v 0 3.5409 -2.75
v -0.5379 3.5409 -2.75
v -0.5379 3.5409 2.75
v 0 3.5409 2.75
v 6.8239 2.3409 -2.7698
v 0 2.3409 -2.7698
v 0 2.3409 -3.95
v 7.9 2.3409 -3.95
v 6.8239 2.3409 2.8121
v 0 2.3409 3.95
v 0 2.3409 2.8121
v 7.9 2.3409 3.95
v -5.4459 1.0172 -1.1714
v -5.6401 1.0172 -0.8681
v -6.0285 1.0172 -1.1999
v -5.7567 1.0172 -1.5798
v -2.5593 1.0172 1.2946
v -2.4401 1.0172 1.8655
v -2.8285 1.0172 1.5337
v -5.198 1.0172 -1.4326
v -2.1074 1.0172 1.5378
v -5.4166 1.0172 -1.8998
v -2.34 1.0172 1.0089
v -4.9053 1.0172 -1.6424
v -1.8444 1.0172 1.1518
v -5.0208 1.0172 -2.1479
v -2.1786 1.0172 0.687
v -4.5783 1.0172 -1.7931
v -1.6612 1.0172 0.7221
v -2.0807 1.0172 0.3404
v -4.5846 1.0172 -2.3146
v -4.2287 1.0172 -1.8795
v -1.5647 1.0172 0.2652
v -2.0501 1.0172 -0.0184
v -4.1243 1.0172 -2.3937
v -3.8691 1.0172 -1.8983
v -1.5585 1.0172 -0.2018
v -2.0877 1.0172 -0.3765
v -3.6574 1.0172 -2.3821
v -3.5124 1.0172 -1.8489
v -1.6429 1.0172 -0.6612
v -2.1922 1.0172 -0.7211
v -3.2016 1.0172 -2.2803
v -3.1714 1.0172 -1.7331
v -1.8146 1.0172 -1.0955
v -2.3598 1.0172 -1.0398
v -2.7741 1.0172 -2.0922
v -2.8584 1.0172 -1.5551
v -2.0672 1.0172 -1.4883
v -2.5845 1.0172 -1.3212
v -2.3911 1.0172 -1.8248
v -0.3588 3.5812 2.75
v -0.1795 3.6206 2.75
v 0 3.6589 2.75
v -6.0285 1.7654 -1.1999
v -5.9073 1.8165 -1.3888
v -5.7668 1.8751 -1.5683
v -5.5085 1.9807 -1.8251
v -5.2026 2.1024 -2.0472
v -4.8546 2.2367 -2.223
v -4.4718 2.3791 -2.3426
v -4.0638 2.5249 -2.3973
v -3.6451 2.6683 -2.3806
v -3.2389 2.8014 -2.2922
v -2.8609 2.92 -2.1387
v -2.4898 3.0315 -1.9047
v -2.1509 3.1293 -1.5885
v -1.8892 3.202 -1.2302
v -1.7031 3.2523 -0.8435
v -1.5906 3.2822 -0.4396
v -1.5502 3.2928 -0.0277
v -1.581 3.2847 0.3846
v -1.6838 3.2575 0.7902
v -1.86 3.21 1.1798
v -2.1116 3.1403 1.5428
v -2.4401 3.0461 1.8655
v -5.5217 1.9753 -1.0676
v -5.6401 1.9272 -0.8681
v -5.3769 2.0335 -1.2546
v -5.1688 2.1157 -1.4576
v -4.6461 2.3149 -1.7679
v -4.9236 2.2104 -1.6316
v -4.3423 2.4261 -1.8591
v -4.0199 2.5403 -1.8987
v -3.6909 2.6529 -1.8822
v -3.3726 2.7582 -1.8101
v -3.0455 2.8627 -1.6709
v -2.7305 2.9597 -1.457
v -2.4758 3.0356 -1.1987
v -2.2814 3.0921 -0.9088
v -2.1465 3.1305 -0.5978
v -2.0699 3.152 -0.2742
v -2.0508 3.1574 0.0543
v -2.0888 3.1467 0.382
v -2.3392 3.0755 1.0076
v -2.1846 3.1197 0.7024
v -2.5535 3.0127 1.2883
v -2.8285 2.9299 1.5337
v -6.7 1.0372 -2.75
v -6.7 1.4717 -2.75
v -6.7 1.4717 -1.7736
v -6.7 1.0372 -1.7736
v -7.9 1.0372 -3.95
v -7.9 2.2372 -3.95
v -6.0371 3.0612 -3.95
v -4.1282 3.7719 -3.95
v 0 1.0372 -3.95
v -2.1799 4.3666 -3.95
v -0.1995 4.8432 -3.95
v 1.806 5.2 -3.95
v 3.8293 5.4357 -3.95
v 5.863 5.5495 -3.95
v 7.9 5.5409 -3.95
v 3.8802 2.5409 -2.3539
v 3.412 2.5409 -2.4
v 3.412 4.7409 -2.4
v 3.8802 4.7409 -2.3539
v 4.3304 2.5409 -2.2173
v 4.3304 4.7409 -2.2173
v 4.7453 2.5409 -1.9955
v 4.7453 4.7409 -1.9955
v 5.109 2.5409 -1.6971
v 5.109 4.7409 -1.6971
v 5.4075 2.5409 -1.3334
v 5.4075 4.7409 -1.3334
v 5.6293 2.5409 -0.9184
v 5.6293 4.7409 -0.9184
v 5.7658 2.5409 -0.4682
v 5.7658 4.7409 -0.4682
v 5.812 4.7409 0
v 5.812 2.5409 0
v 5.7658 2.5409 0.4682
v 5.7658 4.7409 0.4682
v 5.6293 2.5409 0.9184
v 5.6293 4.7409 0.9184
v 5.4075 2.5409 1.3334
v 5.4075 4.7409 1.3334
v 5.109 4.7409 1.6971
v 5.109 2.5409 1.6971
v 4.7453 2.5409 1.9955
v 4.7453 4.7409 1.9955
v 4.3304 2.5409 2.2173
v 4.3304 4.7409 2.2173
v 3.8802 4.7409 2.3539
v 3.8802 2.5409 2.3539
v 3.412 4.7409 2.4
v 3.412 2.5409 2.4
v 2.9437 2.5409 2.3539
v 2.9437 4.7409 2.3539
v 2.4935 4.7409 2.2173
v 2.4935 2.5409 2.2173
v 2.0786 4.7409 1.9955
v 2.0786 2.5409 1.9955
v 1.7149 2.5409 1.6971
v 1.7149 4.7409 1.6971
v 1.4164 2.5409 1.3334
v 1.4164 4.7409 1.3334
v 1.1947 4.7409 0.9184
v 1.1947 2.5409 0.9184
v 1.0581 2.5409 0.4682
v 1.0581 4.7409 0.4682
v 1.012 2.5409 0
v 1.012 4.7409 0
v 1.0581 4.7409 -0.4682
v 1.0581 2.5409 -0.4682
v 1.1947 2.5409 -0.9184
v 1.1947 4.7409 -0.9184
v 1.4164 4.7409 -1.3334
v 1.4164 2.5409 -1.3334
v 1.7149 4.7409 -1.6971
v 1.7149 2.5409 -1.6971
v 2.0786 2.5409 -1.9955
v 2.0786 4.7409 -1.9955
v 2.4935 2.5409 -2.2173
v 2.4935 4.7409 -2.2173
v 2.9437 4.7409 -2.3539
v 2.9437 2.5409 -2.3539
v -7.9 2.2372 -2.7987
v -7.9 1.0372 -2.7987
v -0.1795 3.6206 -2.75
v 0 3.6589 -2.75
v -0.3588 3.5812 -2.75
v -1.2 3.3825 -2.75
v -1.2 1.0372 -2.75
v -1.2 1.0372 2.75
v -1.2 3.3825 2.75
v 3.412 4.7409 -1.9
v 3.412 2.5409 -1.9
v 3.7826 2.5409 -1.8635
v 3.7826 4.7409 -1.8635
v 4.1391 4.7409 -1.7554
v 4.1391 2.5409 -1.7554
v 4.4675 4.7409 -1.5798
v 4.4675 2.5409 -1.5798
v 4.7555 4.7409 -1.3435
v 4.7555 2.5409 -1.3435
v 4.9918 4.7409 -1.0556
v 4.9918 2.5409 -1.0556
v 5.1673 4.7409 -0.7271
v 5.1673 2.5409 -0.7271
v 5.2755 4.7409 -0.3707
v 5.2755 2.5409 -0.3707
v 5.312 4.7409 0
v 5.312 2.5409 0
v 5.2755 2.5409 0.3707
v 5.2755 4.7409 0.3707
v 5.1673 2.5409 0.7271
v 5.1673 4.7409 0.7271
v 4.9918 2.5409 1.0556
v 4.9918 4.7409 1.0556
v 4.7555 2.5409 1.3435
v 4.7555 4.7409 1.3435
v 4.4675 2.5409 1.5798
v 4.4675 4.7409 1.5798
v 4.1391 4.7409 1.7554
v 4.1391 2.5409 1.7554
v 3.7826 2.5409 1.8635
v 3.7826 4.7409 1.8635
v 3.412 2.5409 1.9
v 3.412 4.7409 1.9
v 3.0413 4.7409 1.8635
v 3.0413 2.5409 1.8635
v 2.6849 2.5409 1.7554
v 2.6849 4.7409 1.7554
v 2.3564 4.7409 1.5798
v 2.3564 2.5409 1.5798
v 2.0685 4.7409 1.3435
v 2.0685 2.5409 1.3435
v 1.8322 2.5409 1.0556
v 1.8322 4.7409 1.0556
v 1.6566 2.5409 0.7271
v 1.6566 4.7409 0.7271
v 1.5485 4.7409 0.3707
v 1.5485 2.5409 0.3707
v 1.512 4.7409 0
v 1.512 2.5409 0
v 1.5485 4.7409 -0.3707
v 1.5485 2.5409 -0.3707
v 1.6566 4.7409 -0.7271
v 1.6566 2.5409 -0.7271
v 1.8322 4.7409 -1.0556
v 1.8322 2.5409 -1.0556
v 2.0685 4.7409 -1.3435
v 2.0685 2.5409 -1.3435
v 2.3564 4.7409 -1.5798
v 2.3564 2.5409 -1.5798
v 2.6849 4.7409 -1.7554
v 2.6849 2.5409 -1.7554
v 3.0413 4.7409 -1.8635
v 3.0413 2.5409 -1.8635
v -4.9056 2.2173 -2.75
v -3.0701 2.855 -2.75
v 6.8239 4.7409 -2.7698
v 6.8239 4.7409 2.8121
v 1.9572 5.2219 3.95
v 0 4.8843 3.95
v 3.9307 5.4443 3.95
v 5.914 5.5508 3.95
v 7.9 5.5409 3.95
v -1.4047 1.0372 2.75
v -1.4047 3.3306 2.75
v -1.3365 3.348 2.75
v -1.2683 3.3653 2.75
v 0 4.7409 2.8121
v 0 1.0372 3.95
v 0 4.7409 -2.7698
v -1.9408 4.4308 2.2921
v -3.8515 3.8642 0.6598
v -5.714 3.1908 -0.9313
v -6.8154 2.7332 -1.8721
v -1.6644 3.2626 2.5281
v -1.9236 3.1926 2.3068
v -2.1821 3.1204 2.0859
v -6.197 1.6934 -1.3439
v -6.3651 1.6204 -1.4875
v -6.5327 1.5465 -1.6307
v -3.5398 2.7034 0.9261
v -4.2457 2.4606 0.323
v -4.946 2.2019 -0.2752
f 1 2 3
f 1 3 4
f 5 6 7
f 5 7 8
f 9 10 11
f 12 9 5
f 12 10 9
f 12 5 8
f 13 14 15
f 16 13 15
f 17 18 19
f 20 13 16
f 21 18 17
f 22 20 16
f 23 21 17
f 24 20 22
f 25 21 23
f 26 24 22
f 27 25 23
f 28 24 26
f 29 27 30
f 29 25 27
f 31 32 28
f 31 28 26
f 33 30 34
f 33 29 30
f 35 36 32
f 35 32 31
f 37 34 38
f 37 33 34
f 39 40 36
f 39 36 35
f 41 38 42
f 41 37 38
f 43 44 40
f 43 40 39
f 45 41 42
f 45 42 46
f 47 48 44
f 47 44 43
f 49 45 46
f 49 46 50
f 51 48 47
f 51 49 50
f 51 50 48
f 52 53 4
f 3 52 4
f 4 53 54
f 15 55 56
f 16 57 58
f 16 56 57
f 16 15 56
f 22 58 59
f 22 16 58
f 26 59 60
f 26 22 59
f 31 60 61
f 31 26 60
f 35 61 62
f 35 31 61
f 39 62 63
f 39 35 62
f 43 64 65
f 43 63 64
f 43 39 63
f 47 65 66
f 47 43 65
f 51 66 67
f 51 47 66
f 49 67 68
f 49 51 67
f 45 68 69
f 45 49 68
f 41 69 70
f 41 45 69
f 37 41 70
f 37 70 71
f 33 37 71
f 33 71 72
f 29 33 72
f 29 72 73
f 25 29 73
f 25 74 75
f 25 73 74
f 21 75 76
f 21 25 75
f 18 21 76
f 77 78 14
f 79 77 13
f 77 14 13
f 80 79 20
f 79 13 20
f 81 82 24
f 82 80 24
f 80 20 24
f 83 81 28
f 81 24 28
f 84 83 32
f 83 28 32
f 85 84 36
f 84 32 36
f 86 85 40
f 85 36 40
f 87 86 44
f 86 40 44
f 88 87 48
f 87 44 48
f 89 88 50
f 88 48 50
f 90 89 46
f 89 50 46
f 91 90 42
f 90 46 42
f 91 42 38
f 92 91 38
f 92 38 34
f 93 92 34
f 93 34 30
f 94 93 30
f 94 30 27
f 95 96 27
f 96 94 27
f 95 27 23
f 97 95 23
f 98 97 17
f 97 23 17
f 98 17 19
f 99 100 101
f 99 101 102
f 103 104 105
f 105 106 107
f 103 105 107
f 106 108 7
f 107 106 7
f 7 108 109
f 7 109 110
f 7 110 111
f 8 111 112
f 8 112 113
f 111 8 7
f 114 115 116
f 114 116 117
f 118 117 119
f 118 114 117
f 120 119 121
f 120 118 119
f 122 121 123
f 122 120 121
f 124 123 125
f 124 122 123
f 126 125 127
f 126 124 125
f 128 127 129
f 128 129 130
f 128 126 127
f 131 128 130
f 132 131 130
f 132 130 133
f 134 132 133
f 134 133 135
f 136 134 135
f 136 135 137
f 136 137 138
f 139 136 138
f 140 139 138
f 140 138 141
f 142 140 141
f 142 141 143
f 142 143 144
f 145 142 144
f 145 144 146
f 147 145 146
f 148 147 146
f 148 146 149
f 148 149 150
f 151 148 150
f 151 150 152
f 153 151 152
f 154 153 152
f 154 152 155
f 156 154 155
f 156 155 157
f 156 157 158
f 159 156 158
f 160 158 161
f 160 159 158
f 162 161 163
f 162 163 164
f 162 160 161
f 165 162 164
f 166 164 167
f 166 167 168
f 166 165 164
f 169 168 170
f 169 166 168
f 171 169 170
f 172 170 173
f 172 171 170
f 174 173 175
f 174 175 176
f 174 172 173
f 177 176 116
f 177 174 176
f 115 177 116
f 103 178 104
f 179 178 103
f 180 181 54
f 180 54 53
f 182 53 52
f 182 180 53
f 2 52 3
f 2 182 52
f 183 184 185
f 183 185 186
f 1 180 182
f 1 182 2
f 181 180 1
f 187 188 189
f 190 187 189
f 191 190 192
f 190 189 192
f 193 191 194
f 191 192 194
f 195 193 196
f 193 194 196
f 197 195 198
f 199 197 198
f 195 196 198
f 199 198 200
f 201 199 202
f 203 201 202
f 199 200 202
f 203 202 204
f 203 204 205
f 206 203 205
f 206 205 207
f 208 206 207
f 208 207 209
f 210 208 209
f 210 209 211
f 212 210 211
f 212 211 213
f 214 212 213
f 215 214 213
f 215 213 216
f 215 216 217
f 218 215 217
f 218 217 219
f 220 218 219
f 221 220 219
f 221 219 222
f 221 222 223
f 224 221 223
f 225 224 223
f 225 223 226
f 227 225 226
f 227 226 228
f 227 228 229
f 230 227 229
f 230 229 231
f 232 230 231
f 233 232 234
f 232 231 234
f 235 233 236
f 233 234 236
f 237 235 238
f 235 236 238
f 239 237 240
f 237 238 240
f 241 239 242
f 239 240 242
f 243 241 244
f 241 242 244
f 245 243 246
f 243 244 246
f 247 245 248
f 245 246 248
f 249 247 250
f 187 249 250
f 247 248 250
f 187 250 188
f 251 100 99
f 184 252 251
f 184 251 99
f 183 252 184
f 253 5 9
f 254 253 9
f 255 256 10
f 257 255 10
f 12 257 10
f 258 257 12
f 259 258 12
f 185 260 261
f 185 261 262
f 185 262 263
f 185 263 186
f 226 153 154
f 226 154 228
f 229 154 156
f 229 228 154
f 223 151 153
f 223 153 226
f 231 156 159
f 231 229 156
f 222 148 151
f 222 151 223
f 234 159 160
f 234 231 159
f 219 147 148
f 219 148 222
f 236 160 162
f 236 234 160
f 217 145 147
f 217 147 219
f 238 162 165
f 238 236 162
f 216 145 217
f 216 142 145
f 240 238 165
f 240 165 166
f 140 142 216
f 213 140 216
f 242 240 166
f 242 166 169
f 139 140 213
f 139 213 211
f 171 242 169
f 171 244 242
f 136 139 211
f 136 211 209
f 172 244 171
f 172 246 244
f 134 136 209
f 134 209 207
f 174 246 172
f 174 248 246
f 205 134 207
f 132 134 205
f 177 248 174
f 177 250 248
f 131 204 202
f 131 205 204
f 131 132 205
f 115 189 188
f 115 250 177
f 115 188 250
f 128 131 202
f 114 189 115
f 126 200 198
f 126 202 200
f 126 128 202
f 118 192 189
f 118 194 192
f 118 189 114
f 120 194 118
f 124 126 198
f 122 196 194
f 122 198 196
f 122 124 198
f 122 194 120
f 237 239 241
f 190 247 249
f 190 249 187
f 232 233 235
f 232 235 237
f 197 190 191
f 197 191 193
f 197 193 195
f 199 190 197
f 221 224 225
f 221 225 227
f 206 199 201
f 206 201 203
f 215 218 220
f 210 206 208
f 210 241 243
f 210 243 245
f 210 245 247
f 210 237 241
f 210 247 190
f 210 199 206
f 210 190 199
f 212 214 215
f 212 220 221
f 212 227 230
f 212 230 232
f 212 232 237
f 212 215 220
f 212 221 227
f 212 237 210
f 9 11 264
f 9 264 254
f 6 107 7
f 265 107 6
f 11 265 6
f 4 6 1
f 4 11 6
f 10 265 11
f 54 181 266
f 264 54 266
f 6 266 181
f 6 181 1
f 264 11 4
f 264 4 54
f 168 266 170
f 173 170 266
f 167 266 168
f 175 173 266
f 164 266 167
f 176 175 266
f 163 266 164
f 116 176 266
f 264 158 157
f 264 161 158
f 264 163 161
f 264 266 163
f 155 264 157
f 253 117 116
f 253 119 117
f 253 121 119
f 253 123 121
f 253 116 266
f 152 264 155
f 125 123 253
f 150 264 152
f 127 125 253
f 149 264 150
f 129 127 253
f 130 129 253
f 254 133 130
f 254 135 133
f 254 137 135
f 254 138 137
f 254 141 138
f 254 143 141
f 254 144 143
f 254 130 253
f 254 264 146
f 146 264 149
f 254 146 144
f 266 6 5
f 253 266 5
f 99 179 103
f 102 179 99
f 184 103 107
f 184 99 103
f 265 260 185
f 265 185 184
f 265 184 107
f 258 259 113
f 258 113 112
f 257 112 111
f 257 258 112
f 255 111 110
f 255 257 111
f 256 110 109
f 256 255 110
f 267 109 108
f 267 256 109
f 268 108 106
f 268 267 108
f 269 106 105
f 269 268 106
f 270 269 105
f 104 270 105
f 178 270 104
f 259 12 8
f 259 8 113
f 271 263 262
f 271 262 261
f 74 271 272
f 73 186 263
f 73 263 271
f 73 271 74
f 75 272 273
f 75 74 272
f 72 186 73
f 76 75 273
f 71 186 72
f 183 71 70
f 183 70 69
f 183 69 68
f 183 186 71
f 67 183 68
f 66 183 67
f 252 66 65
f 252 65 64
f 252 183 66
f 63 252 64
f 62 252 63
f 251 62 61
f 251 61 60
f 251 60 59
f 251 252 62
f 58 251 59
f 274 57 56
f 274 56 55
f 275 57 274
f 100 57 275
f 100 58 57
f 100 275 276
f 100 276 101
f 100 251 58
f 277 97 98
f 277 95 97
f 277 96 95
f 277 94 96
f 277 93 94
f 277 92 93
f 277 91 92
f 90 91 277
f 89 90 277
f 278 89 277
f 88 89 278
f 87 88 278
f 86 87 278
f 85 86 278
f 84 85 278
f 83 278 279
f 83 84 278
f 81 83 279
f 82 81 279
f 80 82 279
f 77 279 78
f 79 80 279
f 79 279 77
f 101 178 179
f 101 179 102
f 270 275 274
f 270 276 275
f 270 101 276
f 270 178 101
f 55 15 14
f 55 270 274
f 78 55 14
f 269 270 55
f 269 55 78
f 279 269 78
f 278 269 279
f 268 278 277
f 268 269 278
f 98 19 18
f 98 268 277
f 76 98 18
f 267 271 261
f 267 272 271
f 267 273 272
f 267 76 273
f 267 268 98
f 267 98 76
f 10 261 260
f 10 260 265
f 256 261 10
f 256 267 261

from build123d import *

# Parameters (mm, degrees)
BOSS_EXTRUDE1_DEPTH      = 3.95
SHELL1_START             = -2.75
SHELL1_DEPTH             = 5.5
BOSS_EXTRUDE2_REACH      = 11.943
BOSS_EXTRUDE2_END_RADIUS = 32.700000868
BOSS_EXTRUDE2_START      = 0.02
SKETCH2_R                = 2.4
SKETCH2_R_2              = 1.9
SKETCH3_W                = 6.823927471
SKETCH3_H                = 5.581929969
CUT_EXTRUDE1_DEPTH       = 2.4
BOSS_EXTRUDE3_REACH      = 11.601
BOSS_EXTRUDE3_START      = -0.2
SKETCH4_R                = 2.4
SKETCH4_R_2              = 1.9
CUT_EXTRUDE6_DEPTH       = 10.923471076
CUT_EXTRUDE6_DEPTH_BACK  = 10.923471076


# Read off the part's stored shape, not the designer's step: Shell1
with BuildPart() as part:
    # Sketch1 → Boss-Extrude1 (new, symmetric)
    with BuildSketch(Plane.XY):
        with BuildLine():
            Line((-7.9, 1.037208095), (0, 1.037208095))
            Line((0, 1.037208095), (0, 2.340892579))
            Line((0, 2.340892579), (7.9, 2.340892579))
            Line((7.9, 2.340892579), (7.9, 5.540892579))
            ThreePointArc((7.9, 5.540892579), (-0.199501968, 4.843176285), (-7.9, 2.237208095))
            Line((-7.9, 2.237208095), (-7.9, 1.037208095))
        make_face()
    extrude(amount=BOSS_EXTRUDE1_DEPTH, both=True)

    # Shell1 outline → Shell1 (cut)
    with BuildSketch(Plane.XY.offset(SHELL1_START)):
        with BuildLine():
            Line((-1.2, 1.037208095), (-1.2, 3.382492095))
            ThreePointArc((-1.2, 3.382492095), (-3.992613389, 2.549753458), (-6.7, 1.471699231))
            Line((-6.7, 1.471699231), (-6.7, 1.037208095))
            Line((-6.7, 1.037208095), (-1.2, 1.037208095))
        make_face()
        with BuildLine():
            ThreePointArc((6.7, 4.360765395), (3.058165542, 4.152993699), (-0.537868318, 3.540892579))
            Line((-0.537868318, 3.540892579), (6.7, 3.540892579))
            Line((6.7, 3.540892579), (6.7, 4.360765395))
        make_face()
    extrude(amount=SHELL1_DEPTH, mode=Mode.SUBTRACT)

    # Boss-Extrude2: up to this cylinder (the profile starts inside it)
    boss_extrude2_end = Plane(origin=(6.738734935, -28.339212532, 2.332118), z_dir=(0, 0, -1)) * Cylinder(BOSS_EXTRUDE2_END_RADIUS, 90.286001737, mode=Mode.PRIVATE)
    # Sketch2 → Boss-Extrude2 (add, up to the surface)
    with BuildSketch(Plane(origin=(0, 1.037208095, 0), x_dir=(-1, 0, 0), z_dir=(0, -1, 0)).offset(BOSS_EXTRUDE2_START), mode=Mode.PRIVATE) as boss_extrude2_sk1:
        with Locations(Location((3.95, 0, 0), (0, 0, 90))):
            Circle(SKETCH2_R)
        with Locations(Location((3.95, 0, 0), (0, 0, 90))):
            Circle(SKETCH2_R_2, mode=Mode.SUBTRACT)
    boss_extrude2_tool1 = extrude(boss_extrude2_sk1.sketch, amount=-BOSS_EXTRUDE2_REACH, mode=Mode.PRIVATE) & boss_extrude2_end
    add(boss_extrude2_tool1.solids().sort_by_distance((-3.95, 1.017208, 2.332118))[0])

    # Sketch3 → Cut-Extrude1 (cut)
    with BuildSketch(Plane.XZ.offset(-2.340892579)):
        with Locations((3.411963736, 0.021143674)):
            Rectangle(SKETCH3_W, SKETCH3_H)
    extrude(amount=-CUT_EXTRUDE1_DEPTH, mode=Mode.SUBTRACT)

    # Sketch4 → Boss-Extrude3 (add, up to next)
    with BuildSketch(Plane(origin=(0, 2.340892579, 0), x_dir=(-1, 0, 0), z_dir=(0, -1, 0)).offset(BOSS_EXTRUDE3_START), mode=Mode.PRIVATE) as boss_extrude3_sk1:
        with Locations(Location((-3.411963735, 0, 0), (0, 0, 90))):
            Circle(SKETCH4_R)
        with Locations(Location((-3.411963735, 0, 0), (0, 0, 90))):
            Circle(SKETCH4_R_2, mode=Mode.SUBTRACT)
    boss_extrude3_tool1 = extrude(boss_extrude3_sk1.sketch, amount=-BOSS_EXTRUDE3_REACH, mode=Mode.PRIVATE) - part.part
    add(boss_extrude3_tool1.solids().sort_by_distance((3.411964, 2.540893, 2.332118))[0])

    # Sketch10 → Cut-Extrude6 (cut, two sides: drawn at the far end of the back side and taken through both)
    with BuildSketch(Plane(origin=(0, 1.037208095, 0), x_dir=(-1, 0, 0), z_dir=(0, -1, 0)).offset(-CUT_EXTRUDE6_DEPTH_BACK)):
        Polygon((7.9, 2.798684465), (0, -3.95), (7.9, -3.95), align=None)
    extrude(amount=CUT_EXTRUDE6_DEPTH + CUT_EXTRUDE6_DEPTH_BACK, mode=Mode.SUBTRACT)


solid = part.part
